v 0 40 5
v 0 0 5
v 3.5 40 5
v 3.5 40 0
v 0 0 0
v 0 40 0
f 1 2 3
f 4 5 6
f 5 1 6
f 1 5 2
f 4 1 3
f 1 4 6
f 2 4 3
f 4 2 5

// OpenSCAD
difference() {
	cube([40, 40, 5]);
	translate([0, 0, -1]) {
		rotate([0, 0, -5]) {
			cube([400, 400, 400]);
		}
	}
}
